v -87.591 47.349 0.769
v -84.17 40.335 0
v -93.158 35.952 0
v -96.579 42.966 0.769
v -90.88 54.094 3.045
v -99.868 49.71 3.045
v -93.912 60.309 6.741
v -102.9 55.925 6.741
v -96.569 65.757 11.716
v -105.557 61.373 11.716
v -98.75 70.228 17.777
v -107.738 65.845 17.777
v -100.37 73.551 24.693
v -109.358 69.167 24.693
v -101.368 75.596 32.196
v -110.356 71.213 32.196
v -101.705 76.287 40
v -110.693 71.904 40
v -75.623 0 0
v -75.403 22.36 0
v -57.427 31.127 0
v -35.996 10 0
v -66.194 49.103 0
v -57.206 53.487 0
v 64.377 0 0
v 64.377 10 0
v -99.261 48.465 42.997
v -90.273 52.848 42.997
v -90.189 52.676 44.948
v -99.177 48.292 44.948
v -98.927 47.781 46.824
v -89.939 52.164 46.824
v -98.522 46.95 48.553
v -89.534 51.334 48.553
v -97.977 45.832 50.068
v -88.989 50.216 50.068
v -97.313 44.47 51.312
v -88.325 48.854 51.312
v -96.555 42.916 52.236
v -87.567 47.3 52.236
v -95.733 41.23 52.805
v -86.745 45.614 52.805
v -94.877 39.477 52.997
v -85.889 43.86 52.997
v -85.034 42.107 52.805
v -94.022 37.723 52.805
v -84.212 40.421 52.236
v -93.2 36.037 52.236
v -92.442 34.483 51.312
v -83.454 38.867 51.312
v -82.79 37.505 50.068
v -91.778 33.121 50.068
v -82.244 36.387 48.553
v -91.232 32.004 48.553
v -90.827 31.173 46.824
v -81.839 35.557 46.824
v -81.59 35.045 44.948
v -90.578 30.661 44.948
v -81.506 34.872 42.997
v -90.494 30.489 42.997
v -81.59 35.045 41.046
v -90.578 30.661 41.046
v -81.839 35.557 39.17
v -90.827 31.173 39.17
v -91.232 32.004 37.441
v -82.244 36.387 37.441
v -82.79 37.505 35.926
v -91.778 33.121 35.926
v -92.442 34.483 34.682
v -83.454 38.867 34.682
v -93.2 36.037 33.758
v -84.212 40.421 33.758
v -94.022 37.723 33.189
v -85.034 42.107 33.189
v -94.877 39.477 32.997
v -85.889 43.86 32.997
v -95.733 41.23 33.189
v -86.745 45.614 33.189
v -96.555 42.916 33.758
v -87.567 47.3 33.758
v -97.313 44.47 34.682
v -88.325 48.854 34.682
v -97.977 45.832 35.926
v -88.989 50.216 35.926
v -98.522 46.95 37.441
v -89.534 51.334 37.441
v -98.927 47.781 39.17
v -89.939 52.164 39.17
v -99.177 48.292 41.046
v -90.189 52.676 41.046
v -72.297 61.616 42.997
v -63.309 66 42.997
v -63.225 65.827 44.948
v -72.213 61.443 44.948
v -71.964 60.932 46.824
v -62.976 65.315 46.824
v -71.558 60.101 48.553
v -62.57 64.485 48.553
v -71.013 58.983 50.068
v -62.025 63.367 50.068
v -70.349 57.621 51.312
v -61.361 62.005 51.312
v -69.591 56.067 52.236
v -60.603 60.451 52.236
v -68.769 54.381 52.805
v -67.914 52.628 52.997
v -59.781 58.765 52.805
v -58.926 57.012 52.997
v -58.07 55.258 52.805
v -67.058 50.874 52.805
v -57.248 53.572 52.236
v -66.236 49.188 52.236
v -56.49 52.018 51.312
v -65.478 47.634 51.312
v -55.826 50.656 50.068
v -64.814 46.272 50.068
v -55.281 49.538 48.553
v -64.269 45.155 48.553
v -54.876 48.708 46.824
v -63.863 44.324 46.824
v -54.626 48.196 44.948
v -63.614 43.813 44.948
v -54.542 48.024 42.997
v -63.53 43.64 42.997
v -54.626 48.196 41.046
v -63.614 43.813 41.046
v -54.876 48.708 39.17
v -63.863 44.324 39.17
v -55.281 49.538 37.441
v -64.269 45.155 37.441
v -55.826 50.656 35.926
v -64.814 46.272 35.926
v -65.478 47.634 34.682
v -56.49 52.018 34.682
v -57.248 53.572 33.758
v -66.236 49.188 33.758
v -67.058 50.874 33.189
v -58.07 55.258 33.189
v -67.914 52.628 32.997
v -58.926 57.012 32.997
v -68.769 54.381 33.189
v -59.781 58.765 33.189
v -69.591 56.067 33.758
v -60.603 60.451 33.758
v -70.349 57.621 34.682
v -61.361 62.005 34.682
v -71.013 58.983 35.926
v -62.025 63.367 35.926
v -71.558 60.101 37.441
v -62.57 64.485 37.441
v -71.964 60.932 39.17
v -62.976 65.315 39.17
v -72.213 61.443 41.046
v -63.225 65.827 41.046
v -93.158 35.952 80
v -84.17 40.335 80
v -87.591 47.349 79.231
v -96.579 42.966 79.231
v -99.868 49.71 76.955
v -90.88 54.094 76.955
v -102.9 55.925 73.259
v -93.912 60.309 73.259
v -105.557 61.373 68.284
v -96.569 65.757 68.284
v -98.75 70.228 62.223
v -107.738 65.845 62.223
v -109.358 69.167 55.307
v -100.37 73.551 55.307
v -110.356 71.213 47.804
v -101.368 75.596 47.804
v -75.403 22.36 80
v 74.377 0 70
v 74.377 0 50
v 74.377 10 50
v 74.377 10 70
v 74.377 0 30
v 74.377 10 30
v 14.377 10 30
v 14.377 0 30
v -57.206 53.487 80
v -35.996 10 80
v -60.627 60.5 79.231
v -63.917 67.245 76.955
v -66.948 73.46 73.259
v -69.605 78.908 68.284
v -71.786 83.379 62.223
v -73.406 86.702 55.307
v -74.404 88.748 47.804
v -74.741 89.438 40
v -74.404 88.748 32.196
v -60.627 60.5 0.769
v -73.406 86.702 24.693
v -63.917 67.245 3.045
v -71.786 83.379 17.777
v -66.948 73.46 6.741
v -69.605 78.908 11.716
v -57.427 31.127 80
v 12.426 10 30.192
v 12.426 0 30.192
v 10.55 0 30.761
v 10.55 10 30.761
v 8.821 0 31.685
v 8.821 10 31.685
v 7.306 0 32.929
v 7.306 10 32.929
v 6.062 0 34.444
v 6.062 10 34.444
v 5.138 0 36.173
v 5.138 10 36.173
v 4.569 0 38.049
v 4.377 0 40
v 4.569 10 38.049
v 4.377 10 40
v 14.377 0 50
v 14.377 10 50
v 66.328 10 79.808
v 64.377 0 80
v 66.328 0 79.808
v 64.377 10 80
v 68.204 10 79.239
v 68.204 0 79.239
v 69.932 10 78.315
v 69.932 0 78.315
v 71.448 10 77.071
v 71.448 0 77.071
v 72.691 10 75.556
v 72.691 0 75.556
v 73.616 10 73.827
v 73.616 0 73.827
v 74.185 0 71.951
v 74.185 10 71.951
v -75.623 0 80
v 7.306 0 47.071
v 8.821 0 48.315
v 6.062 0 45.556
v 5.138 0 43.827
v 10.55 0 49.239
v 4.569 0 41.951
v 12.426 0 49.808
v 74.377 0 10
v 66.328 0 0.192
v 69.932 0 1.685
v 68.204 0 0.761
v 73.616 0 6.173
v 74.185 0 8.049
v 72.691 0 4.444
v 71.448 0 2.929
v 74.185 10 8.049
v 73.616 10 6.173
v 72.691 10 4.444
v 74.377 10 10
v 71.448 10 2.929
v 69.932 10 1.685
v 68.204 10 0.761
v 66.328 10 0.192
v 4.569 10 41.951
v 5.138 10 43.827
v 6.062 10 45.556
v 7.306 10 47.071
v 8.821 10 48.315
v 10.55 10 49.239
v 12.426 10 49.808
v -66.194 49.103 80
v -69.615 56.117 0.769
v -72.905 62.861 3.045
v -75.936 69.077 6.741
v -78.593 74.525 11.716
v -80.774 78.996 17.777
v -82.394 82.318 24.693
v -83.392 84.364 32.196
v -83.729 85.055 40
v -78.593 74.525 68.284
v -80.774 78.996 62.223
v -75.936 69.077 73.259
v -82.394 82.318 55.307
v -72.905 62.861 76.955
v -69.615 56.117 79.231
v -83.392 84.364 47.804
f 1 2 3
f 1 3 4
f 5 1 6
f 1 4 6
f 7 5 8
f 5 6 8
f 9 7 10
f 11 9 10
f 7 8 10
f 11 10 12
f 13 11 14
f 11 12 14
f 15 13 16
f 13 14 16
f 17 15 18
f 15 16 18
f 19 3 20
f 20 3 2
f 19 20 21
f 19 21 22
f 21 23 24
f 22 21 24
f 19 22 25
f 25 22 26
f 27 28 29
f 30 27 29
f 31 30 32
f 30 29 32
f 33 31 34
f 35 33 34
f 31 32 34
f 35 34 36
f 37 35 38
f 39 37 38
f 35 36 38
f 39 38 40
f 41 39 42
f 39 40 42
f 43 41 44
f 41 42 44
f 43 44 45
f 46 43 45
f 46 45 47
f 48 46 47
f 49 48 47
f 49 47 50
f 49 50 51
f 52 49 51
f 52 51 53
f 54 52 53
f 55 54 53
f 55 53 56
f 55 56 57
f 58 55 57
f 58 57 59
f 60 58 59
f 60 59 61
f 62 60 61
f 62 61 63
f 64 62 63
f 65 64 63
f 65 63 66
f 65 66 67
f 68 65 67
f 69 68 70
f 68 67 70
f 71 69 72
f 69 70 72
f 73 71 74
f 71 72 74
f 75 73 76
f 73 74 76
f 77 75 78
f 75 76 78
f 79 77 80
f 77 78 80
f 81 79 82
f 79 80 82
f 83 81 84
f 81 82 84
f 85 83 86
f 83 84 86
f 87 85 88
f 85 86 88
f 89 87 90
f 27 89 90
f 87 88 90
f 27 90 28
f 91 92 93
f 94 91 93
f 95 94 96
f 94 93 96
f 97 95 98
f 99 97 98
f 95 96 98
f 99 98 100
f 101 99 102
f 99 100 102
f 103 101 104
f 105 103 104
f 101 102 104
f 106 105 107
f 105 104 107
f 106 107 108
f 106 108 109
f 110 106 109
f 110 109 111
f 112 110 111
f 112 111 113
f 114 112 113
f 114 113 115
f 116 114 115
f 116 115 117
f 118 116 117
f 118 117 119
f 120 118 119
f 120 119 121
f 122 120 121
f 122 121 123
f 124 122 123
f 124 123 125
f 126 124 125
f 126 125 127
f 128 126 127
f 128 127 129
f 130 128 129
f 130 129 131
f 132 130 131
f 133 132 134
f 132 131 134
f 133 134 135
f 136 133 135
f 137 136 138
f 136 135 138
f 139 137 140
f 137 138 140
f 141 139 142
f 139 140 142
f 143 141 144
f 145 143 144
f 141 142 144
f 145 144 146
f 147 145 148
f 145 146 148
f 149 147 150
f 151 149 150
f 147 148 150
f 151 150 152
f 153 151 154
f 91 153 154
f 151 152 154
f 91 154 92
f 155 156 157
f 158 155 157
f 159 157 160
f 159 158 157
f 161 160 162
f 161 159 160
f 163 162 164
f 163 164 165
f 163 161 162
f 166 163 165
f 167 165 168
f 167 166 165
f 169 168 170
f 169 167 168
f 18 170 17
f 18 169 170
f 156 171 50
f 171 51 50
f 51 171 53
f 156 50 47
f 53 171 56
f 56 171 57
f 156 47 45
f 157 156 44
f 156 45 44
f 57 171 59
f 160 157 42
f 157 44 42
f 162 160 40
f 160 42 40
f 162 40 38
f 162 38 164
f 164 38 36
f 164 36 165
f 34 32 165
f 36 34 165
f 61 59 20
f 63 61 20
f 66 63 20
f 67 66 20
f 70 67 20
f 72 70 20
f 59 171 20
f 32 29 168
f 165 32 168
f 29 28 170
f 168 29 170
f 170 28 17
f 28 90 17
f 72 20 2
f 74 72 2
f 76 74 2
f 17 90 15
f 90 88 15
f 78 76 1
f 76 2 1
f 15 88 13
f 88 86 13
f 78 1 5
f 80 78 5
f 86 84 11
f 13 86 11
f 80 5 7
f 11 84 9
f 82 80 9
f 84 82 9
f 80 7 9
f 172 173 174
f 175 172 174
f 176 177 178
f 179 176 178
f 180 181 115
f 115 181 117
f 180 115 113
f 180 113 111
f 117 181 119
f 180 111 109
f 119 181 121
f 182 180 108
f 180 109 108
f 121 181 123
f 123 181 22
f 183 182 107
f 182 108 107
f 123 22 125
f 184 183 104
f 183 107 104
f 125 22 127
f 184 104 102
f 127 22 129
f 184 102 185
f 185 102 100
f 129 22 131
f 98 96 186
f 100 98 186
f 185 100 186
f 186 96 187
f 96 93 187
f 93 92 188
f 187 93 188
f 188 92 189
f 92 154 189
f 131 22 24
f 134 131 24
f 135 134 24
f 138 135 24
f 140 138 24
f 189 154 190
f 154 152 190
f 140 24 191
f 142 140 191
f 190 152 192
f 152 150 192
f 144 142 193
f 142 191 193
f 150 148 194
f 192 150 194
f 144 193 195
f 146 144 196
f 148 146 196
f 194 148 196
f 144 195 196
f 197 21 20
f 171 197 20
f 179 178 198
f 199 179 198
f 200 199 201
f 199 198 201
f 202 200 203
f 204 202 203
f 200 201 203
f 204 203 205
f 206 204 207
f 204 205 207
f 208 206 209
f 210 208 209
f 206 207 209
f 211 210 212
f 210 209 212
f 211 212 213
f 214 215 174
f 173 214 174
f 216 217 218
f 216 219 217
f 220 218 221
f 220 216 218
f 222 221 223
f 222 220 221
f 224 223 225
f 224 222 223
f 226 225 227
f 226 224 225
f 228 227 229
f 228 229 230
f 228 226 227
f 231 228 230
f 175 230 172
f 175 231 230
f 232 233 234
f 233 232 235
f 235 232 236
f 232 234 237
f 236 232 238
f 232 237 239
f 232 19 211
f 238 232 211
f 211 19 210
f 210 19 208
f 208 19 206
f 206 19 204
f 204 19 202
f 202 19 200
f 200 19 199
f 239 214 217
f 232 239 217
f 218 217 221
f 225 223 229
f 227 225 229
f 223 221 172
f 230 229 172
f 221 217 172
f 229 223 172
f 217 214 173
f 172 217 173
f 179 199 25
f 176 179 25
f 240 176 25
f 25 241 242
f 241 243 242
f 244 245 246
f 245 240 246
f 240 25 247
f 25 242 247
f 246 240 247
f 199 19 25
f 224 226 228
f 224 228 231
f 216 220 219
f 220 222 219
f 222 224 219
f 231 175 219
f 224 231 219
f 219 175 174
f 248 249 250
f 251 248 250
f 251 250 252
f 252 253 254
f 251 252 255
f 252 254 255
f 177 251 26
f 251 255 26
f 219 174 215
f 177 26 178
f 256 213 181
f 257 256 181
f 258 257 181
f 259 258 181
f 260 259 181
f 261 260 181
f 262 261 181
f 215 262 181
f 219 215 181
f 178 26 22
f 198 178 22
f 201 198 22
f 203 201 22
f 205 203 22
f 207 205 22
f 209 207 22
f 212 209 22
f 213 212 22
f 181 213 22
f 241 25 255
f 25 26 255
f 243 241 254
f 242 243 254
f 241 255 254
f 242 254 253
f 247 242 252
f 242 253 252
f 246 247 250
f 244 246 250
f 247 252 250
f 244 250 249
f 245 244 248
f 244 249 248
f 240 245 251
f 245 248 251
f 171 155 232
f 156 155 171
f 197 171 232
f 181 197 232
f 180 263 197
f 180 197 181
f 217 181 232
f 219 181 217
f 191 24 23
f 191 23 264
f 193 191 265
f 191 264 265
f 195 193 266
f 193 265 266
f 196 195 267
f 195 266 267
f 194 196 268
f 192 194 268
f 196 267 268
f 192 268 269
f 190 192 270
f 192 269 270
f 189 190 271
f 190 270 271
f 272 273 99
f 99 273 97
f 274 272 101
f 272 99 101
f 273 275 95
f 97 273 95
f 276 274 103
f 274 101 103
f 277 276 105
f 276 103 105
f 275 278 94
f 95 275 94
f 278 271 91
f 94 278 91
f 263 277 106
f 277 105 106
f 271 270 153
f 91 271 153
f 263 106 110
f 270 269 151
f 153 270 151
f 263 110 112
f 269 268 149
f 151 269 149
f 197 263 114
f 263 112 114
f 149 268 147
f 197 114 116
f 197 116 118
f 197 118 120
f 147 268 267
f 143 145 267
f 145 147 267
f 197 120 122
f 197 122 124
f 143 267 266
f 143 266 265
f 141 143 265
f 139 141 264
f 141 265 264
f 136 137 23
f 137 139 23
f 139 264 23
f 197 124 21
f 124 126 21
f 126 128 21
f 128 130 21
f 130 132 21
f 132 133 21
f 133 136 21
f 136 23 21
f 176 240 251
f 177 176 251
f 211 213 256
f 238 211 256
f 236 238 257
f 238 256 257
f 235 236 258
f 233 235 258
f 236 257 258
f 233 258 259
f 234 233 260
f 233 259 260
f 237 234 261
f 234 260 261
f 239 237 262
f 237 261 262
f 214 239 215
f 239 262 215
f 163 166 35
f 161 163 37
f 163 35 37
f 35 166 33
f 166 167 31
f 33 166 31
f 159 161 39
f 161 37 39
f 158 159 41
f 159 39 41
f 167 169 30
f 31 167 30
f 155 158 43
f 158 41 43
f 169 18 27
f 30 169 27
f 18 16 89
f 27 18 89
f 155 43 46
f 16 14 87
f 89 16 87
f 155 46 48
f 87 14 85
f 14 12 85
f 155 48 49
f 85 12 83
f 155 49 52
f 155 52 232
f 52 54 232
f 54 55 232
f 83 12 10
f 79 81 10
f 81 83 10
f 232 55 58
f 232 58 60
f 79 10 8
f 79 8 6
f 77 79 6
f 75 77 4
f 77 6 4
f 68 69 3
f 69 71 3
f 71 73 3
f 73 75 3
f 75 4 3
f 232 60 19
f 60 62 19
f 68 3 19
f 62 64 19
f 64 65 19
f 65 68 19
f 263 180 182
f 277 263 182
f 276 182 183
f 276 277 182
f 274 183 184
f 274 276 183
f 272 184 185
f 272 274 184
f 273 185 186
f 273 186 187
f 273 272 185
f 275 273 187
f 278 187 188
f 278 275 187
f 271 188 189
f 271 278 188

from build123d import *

# Parameters (mm, degrees)
F1_DEPTH = 80
F3_DEPTH = 25
F4_R     = 39.99999
F6_R     = 10
F7_DEPTH = 101.1
F8_R     = 10


# Not quite as in the source:
# - a fillet or chamfer is up to 0.001 mm smaller than in the source, because OpenCascade refuses the exact size


with BuildPart() as f1:
    # F0 (on Top) → F1 (new body)
    with BuildSketch(Plane.XY):
        Polygon((-75.6232507176, 0), (74.3767492824, 0), (74.3767492824, 10), (-35.9964989842, 10), (-74.7411806087, 89.4383695755), (-83.7291210717, 85.0546581076), (-57.4268522644, 31.1270153297), (-75.4027331904, 22.3595923939), (-101.7050019977, 76.2872351718), (-110.6929424607, 71.9035237039), align=None)
    extrude(amount=F1_DEPTH)

    # F2 (on face) → F3 (cut)
    with BuildSketch(Plane(origin=(0, 10, 0), x_dir=(-1, 0, 0), z_dir=(0, 1, 0))):
        with BuildLine():
            ThreePointArc((-14.3767492824, 50), (-24.3767492824, 40), (-14.3767492824, 30))
            Line((-14.3767492824, 30), (-14.3767492824, 50))
        make_face()
        with BuildLine():
            Line((-134.3767492824, 30), (-14.3767492824, 30))
            ThreePointArc((-14.3767492824, 30), (-24.3767492824, 40), (-14.3767492824, 50))
            Line((-14.3767492824, 50), (-134.3767492824, 50))
            Line((-134.3767492824, 50), (-134.3767492824, 30))
        make_face()
        with BuildLine():
            Line((-14.3767492824, 50), (-14.3767492824, 30))
            ThreePointArc((-14.3767492824, 30), (-7.3056814706, 32.9289321881), (-4.3767492824, 40))
            ThreePointArc((-4.3767492824, 40), (-7.3056814706, 47.0710678119), (-14.3767492824, 50))
        make_face()
    extrude(amount=-F3_DEPTH, mode=Mode.SUBTRACT)

    # F4 (radius 40 in the source; OpenCascade refuses exactly that, so slightly less here)
    f4_edges = [f1.edges().sort_by_distance(p)[0] for p in [
        (-79.235151, 87.246514, 80),
        (-106.198972, 74.095379, 80),
        (-106.198972, 74.095379, 0),
        (-79.235151, 87.246514, 0),
    ]]
    fillet(f4_edges, radius=F4_R)

    # F6 (on face) → F7 (cut)
    with BuildSketch(Plane(origin=(-25.1390245597, -12.2611215225, 0), x_dir=(-0.4383711468, 0.8987940463, 0), z_dir=(0.8987940463, 0.4383711468, 0))):
        with Locations((77.0729333162, 42.9970733821)):
            Circle(F6_R)
    extrude(amount=-F7_DEPTH, mode=Mode.SUBTRACT)

    # F8
    f8_edges = [f1.edges().sort_by_distance(p)[0] for p in [
        (74.376749, 5, 80),
        (74.376749, 5, 0),
    ]]
    fillet(f8_edges, radius=F8_R)


solid = f1.part
